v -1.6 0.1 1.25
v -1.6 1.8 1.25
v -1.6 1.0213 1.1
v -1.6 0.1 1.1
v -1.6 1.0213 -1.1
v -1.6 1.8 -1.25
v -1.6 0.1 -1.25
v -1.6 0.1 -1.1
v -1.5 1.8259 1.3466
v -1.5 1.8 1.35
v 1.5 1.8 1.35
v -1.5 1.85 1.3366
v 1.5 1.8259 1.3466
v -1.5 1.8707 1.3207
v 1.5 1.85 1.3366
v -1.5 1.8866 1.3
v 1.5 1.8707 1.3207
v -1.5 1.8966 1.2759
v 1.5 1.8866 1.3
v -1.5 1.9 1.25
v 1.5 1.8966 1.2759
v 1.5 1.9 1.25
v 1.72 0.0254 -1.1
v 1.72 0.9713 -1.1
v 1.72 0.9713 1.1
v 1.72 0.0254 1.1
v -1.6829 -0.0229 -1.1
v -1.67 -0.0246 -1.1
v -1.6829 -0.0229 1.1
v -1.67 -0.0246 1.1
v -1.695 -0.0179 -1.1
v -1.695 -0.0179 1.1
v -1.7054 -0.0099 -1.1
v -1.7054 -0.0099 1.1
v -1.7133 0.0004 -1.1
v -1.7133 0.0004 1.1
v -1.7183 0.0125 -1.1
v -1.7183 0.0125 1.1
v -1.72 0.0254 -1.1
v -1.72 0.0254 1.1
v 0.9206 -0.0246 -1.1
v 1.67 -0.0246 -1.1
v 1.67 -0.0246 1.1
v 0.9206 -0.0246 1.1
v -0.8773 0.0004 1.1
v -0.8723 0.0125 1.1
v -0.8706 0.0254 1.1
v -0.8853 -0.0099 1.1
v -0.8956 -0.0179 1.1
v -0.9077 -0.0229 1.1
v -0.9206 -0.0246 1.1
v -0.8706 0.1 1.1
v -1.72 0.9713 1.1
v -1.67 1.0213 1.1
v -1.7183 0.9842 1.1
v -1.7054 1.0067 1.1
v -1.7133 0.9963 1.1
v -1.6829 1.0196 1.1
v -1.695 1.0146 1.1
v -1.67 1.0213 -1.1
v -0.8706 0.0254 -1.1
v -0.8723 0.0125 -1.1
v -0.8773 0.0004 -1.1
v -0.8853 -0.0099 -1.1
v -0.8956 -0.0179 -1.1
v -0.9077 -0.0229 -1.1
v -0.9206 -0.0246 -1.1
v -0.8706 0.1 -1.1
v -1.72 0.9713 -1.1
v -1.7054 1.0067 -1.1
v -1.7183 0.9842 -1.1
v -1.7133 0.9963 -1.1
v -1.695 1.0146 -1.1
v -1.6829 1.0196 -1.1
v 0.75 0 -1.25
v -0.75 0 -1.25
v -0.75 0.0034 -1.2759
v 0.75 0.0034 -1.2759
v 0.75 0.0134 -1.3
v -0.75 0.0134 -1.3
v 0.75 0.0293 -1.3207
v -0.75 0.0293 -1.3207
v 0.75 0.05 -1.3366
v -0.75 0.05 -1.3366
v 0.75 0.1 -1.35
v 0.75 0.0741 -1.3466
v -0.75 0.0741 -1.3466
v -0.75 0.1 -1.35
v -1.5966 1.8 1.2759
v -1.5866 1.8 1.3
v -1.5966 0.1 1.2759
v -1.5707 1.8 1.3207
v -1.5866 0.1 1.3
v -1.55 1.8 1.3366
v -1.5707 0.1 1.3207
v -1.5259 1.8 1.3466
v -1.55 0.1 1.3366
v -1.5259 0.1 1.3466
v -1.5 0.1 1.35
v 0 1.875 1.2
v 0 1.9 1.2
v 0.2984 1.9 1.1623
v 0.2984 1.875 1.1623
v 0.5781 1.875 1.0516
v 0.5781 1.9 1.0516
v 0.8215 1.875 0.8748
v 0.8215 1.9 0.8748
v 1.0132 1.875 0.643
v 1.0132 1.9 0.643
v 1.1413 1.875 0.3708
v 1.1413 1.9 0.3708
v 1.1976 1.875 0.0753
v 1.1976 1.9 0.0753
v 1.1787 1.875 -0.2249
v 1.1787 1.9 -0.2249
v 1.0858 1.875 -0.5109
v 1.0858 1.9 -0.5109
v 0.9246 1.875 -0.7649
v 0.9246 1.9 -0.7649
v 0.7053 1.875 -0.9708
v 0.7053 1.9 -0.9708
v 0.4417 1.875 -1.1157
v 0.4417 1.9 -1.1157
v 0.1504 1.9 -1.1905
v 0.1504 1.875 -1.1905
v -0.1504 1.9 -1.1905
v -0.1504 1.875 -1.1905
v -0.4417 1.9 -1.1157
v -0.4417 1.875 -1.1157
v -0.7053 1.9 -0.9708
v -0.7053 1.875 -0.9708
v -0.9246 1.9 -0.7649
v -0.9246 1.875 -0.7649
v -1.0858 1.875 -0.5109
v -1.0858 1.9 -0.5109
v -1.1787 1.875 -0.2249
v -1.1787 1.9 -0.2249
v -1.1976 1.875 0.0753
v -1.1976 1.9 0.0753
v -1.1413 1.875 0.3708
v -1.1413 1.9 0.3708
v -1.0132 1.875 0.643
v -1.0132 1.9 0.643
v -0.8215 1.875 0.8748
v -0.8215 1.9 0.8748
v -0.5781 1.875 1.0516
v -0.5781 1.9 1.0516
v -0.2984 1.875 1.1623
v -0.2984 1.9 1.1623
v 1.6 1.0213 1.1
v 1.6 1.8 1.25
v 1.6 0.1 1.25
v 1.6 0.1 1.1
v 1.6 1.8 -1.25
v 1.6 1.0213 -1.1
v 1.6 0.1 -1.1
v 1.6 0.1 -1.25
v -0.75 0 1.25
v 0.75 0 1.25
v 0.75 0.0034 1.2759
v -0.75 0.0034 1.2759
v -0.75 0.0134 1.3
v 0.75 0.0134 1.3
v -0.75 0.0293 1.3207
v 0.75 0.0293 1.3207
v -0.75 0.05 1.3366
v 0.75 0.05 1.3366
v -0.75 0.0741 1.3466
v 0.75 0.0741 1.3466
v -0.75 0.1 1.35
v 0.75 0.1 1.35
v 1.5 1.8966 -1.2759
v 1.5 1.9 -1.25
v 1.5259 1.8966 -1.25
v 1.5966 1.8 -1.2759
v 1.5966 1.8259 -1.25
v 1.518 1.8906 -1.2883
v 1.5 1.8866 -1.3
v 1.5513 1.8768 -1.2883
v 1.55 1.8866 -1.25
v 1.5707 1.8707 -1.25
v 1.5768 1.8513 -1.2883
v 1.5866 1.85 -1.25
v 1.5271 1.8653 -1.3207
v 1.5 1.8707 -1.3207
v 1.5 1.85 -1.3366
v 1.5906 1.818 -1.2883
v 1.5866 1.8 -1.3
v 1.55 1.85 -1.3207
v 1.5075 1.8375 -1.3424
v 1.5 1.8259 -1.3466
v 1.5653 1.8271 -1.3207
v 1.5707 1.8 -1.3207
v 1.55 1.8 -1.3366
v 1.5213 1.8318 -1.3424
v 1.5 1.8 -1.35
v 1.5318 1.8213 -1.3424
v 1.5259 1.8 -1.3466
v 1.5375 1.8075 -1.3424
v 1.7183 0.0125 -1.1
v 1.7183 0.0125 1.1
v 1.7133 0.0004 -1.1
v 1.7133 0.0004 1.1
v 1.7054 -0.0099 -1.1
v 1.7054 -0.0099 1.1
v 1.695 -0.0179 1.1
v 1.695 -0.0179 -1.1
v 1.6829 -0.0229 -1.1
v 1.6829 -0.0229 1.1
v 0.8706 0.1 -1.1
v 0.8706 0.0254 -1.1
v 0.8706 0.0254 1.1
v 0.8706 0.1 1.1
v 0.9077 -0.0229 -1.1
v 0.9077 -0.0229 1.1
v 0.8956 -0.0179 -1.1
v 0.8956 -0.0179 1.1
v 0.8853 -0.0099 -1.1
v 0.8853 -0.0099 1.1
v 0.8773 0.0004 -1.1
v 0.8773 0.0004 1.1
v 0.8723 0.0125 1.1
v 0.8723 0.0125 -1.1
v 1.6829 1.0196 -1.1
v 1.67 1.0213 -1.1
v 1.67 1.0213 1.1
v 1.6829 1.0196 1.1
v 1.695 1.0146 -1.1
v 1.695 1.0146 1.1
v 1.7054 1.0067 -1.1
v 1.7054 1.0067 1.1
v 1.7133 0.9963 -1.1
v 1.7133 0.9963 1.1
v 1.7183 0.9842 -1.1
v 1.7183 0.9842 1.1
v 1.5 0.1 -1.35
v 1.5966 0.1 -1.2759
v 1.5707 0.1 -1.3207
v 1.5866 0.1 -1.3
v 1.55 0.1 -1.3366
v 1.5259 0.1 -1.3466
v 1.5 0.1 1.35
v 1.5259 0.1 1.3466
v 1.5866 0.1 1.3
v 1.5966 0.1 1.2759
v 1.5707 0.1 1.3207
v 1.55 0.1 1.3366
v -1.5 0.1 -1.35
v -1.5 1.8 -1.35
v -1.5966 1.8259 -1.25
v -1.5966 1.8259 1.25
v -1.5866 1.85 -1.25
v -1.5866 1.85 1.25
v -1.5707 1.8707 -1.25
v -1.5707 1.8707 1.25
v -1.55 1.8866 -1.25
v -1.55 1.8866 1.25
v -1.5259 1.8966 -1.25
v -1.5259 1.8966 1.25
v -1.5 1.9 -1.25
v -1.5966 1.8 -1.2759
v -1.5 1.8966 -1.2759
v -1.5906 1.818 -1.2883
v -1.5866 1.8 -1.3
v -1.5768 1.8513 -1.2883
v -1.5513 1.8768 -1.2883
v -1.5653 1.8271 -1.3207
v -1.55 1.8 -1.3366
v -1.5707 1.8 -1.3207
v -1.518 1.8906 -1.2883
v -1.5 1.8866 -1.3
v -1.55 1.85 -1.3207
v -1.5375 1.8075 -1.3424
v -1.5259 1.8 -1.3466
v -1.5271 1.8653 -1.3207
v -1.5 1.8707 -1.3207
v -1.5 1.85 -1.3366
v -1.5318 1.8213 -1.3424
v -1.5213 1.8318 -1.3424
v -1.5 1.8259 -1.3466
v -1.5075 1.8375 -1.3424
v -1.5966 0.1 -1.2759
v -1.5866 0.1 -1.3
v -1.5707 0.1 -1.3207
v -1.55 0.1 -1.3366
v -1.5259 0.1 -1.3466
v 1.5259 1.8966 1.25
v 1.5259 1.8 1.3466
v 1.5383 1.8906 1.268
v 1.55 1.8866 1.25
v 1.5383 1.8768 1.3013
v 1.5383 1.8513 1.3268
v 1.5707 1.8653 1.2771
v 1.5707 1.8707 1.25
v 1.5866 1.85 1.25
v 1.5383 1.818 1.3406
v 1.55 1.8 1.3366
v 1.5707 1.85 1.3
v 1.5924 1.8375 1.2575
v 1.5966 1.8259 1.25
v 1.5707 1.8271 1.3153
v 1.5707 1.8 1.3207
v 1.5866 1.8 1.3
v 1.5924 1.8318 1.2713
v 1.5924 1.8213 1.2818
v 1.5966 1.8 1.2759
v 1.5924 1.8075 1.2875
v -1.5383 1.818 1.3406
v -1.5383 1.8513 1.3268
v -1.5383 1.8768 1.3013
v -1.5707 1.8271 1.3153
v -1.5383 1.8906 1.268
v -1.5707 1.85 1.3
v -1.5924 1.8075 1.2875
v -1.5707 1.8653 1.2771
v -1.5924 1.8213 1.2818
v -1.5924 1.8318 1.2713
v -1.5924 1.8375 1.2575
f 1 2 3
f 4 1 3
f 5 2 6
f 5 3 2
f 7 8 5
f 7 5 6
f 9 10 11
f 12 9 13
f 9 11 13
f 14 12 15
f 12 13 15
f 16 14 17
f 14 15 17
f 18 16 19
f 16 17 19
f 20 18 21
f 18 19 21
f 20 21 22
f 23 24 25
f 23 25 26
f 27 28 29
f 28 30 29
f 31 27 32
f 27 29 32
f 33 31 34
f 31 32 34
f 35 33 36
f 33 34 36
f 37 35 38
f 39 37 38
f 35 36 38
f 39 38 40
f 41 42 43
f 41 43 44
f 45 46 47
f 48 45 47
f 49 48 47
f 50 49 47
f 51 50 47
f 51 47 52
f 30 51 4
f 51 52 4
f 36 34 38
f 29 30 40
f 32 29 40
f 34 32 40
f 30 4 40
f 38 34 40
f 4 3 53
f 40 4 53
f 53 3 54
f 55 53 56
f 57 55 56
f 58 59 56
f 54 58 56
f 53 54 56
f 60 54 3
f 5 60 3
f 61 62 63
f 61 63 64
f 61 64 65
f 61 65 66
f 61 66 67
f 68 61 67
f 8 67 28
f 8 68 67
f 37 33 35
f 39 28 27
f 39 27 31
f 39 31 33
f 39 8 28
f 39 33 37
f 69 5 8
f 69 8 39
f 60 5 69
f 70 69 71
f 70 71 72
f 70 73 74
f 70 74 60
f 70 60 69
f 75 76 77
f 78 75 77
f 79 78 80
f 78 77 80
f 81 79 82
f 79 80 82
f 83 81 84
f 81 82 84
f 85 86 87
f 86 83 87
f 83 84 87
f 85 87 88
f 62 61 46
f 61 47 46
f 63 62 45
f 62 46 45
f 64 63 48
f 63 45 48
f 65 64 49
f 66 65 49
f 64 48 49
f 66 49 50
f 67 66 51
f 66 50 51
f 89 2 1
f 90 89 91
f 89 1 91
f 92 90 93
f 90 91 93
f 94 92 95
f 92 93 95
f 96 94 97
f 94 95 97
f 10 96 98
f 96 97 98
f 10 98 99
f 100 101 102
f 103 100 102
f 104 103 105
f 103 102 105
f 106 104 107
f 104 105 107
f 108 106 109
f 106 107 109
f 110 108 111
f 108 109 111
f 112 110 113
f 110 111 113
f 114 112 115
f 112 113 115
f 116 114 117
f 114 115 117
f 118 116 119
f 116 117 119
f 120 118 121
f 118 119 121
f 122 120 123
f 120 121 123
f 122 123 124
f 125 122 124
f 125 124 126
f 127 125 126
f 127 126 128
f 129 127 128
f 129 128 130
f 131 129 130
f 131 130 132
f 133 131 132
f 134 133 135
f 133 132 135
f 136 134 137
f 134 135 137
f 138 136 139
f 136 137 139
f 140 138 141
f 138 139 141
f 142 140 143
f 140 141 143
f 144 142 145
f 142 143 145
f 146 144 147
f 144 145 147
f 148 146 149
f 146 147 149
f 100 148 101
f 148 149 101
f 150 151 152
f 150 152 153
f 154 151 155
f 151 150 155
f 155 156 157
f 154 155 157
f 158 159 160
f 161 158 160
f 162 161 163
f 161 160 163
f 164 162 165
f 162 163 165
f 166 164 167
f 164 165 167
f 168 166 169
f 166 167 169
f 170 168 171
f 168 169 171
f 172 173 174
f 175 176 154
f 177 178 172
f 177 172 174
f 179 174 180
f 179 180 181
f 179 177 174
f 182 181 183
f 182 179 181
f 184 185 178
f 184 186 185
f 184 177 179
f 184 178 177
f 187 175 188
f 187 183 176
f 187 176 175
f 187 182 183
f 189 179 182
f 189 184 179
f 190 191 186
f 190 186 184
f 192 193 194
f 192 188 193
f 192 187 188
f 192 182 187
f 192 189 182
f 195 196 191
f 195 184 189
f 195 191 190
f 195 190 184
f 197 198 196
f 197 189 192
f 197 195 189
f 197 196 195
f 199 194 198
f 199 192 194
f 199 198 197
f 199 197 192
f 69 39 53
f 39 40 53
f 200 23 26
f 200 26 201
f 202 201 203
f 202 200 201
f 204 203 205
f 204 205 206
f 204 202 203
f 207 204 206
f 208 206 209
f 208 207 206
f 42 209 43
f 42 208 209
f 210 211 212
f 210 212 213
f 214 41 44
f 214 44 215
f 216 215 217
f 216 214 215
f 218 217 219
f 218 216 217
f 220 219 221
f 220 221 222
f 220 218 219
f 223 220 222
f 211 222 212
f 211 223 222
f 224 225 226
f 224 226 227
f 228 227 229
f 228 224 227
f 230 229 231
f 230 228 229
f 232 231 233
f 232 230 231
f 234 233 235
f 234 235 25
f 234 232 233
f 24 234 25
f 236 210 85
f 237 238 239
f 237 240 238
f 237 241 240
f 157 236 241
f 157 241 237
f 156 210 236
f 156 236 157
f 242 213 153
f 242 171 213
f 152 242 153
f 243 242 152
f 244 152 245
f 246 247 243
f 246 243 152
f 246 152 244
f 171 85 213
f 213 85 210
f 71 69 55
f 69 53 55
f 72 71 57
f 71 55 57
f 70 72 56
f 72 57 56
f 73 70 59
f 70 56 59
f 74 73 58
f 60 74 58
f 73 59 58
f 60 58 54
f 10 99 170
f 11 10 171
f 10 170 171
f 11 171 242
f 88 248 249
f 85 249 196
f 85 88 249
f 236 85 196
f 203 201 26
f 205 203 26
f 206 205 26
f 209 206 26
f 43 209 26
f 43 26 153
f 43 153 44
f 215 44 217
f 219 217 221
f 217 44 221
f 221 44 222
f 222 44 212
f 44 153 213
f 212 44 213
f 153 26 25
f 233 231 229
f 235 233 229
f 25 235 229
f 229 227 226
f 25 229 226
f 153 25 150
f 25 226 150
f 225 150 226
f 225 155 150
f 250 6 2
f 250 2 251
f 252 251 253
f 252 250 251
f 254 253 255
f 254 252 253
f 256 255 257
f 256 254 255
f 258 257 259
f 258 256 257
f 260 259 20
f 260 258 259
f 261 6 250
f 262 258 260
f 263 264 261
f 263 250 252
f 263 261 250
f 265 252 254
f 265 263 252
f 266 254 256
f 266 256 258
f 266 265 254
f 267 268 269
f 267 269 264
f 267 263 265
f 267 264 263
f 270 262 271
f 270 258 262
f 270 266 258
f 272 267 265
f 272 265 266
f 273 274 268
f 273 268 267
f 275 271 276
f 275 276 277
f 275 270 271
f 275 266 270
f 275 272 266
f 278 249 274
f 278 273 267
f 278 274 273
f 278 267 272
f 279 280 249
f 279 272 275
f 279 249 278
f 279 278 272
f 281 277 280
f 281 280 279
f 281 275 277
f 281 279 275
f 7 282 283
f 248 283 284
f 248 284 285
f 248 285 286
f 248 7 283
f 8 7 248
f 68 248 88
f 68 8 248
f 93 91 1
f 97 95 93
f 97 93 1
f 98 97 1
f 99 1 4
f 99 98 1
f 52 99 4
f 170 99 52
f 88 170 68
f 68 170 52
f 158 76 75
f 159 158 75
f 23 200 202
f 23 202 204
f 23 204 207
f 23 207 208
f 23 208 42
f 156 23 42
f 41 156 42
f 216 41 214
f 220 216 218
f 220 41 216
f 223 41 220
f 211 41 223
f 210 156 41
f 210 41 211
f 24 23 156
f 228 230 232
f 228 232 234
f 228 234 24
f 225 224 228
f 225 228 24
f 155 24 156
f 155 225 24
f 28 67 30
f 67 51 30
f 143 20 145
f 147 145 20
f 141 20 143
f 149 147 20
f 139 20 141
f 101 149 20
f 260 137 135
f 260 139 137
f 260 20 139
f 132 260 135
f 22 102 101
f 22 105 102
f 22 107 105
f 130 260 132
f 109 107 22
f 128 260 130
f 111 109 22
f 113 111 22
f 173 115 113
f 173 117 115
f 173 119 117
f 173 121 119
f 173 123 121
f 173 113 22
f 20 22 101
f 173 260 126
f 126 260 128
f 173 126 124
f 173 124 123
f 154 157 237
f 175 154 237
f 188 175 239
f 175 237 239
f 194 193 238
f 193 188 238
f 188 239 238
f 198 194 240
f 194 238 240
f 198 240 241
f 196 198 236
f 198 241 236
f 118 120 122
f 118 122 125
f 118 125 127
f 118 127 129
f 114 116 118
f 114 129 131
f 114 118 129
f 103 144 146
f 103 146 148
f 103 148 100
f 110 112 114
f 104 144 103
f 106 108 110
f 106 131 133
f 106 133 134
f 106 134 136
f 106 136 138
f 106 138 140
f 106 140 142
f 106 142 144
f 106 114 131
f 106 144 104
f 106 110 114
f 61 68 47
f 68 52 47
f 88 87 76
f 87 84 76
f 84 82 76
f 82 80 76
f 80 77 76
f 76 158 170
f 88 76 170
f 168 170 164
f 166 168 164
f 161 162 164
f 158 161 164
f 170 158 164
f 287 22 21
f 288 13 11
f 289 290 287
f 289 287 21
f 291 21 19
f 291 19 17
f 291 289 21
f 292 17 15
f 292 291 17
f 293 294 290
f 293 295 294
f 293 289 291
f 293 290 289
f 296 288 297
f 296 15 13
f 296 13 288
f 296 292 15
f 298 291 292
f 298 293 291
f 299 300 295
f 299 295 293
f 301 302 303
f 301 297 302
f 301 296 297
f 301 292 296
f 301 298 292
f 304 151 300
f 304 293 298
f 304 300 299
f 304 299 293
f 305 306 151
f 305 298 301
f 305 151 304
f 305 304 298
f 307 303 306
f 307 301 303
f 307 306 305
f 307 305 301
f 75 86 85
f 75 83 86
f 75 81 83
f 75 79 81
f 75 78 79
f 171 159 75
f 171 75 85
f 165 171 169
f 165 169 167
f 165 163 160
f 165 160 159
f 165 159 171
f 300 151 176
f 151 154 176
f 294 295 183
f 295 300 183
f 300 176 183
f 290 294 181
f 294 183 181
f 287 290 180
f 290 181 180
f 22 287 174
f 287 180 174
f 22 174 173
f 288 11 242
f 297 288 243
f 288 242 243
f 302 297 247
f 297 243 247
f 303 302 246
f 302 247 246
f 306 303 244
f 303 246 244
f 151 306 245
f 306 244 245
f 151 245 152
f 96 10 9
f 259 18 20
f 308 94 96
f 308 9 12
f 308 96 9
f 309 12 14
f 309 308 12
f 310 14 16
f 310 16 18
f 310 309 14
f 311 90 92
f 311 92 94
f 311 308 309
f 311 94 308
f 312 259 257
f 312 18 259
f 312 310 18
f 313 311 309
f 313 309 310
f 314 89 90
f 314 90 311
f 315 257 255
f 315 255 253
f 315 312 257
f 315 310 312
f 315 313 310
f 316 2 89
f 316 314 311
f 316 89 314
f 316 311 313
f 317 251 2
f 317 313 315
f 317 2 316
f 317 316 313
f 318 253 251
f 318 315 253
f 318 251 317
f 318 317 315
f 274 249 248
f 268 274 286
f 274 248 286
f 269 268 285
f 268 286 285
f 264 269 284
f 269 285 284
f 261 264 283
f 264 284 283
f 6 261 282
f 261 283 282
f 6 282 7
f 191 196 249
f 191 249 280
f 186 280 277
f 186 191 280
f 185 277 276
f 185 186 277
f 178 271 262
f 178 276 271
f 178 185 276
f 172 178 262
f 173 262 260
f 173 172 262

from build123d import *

# Parameters (mm, degrees)
SKETCH_2_W          = 3.2
SKETCH_2_H          = 2.7
EXTRUDE_1_DEPTH     = 1.9
FILLET_1_R          = 0.1
FILLET_2_R          = 0.1
FILLET_3_R          = 0.1
FILLET_4_R          = 0.1
FILLET_5_R          = 0.1
SKETCH_3_R          = 1.2
CUT_EXTRUDE_1_DEPTH = 0.025
SKETCH_4_W          = 0.92775498
SKETCH_4_H          = 2.835918068
CUT_EXTRUDE_2_DEPTH = 0.1
EXTRUDE_3_DEPTH     = 1.1


with BuildPart() as part:
    # Эскиз2 → Бобышка-Вытянуть1 (new body)
    with BuildSketch(Plane(origin=(0, 0, 0), x_dir=(1, 0, 0), z_dir=(0, 1, 0))):
        Rectangle(SKETCH_2_W, SKETCH_2_H)
    extrude(amount=EXTRUDE_1_DEPTH)

    # Скругление1
    fillet_1_edges = [part.edges().sort_by_distance(p)[0] for p in [
        (-1.6, 1.9, 0),
        (0, 1.9, 1.35),
        (1.6, 1.9, 0),
        (0, 1.9, -1.35),
    ]]
    fillet(fillet_1_edges, radius=FILLET_1_R)

    # Скругление2
    # the kernel refuses this fillet: 0.1 mm, written as the material it takes off along each edge
    with BuildSketch(Plane(origin=(-1.5, 1.8, 1.25), x_dir=(0, 0, 1), z_dir=(-1, 0, 0))) as fillet_2_piece_1_section:
        Polygon((0, 0), (FILLET_2_R, 0), (FILLET_2_R, FILLET_2_R), (0, FILLET_2_R), align=None)
    fillet_2_piece_1 = extrude(amount=FILLET_2_R, mode=Mode.PRIVATE)
    fillet_2_piece_1 = fillet_2_piece_1 - Plane(origin=(-1.5, 1.8, 1.25), x_dir=(0, -0.7071067811865475, -0.7071067811865475), z_dir=(-1, 0, 0)) * Sphere(FILLET_2_R, mode=Mode.PRIVATE)
    add(fillet_2_piece_1, mode=Mode.SUBTRACT)
    with BuildSketch(Plane(origin=(1.5, 1.8, 1.25), x_dir=(0, 0, 1), z_dir=(1, 0, 0))) as fillet_2_piece_2_section:
        Polygon((0, 0), (FILLET_2_R, 0), (FILLET_2_R, -FILLET_2_R), (0, -FILLET_2_R), align=None)
    fillet_2_piece_2 = extrude(amount=FILLET_2_R, mode=Mode.PRIVATE)
    fillet_2_piece_2 = fillet_2_piece_2 - Plane(origin=(1.5, 1.8, 1.25), x_dir=(0, -0.7071067811865475, -0.7071067811865475), z_dir=(1, 0, 0)) * Sphere(FILLET_2_R, mode=Mode.PRIVATE)
    add(fillet_2_piece_2, mode=Mode.SUBTRACT)
    with BuildSketch(Plane(origin=(1.6, -0.25, 1.35), x_dir=(0, 0, -1), z_dir=(0, 1, 0))) as fillet_2_piece_3:
        with BuildLine():
            CenterArc((FILLET_2_R, FILLET_2_R), FILLET_2_R, 180, 90)
            Line((0, FILLET_2_R), (0, 0))
            Line((0, 0), (FILLET_2_R, 0))
        make_face()
    extrude(amount=2.05, mode=Mode.SUBTRACT)
    with BuildSketch(Plane(origin=(-1.6, -0.25, 1.35), x_dir=(0, 0, -1), z_dir=(0, 1, 0))) as fillet_2_piece_4:
        with BuildLine():
            CenterArc((FILLET_2_R, -FILLET_2_R), FILLET_2_R, 90, 90)
            Line((0, -FILLET_2_R), (0, 0))
            Line((0, 0), (FILLET_2_R, 0))
        make_face()
    extrude(amount=2.05, mode=Mode.SUBTRACT)
    with BuildSketch(Plane(origin=(1.85, 0, 1.35), x_dir=(0, 0, -1), z_dir=(-1, 0, 0))) as fillet_2_piece_5:
        with BuildLine():
            CenterArc((FILLET_2_R, -FILLET_2_R), FILLET_2_R, 90, 90)
            Line((0, -FILLET_2_R), (0, 0))
            Line((0, 0), (FILLET_2_R, 0))
        make_face()
    extrude(amount=3.7, mode=Mode.SUBTRACT)

    # Скругление3
    # the kernel refuses this fillet: 0.1 mm, written as the material it takes off along each edge
    with BuildSketch(Plane(origin=(1.5, 1.8, -1.25), x_dir=(1, 0, 0), z_dir=(0, 0, -1))) as fillet_3_piece_1_section:
        Polygon((0, 0), (FILLET_3_R, 0), (FILLET_3_R, -FILLET_3_R), (0, -FILLET_3_R), align=None)
    fillet_3_piece_1 = extrude(amount=FILLET_3_R, mode=Mode.PRIVATE)
    fillet_3_piece_1 = fillet_3_piece_1 - Plane(origin=(1.5, 1.8, -1.25), x_dir=(-0.7071067811865475, -0.7071067811865475, 0), z_dir=(0, 0, -1)) * Sphere(FILLET_3_R, mode=Mode.PRIVATE)
    add(fillet_3_piece_1, mode=Mode.SUBTRACT)
    with BuildSketch(Plane(origin=(1.5, 0.1, 1.25), x_dir=(1, 0, 0), z_dir=(0, -1, 0))) as fillet_3_piece_2_section:
        Polygon((0, 0), (FILLET_3_R, 0), (FILLET_3_R, FILLET_3_R), (0, FILLET_3_R), align=None)
    fillet_3_piece_2 = extrude(amount=FILLET_3_R, mode=Mode.PRIVATE)
    fillet_3_piece_2 = fillet_3_piece_2 - Plane(origin=(1.5, 0.1, 1.25), x_dir=(-0.7071067811865476, 0, -0.7071067811865475), z_dir=(0, -1, 0)) * Sphere(FILLET_3_R, mode=Mode.PRIVATE)
    add(fillet_3_piece_2, mode=Mode.SUBTRACT)
    with BuildSketch(Plane(origin=(1.6, -0.25, -1.35), x_dir=(-1, 0, 0), z_dir=(0, 1, 0))) as fillet_3_piece_3:
        with BuildLine():
            CenterArc((FILLET_3_R, FILLET_3_R), FILLET_3_R, 180, 90)
            Line((0, FILLET_3_R), (0, 0))
            Line((0, 0), (FILLET_3_R, 0))
        make_face()
    extrude(amount=2.05, mode=Mode.SUBTRACT)
    with BuildSketch(Plane(origin=(1.6, 0, -1.6), x_dir=(-1, 0, 0), z_dir=(0, 0, 1))) as fillet_3_piece_4:
        with BuildLine():
            CenterArc((FILLET_3_R, -FILLET_3_R), FILLET_3_R, 90, 90)
            Line((0, -FILLET_3_R), (0, 0))
            Line((0, 0), (FILLET_3_R, 0))
        make_face()
    extrude(amount=2.85, mode=Mode.SUBTRACT)

    # Скругление4
    # the kernel refuses this fillet: 0.1 mm, written as the material it takes off along each edge
    with BuildSketch(Plane(origin=(-1.5, 1.8, -1.25), x_dir=(-1, 0, 0), z_dir=(0, 0, -1))) as fillet_4_piece_1_section:
        Polygon((0, 0), (FILLET_4_R, 0), (FILLET_4_R, FILLET_4_R), (0, FILLET_4_R), align=None)
    fillet_4_piece_1 = extrude(amount=FILLET_4_R, mode=Mode.PRIVATE)
    fillet_4_piece_1 = fillet_4_piece_1 - Plane(origin=(-1.5, 1.8, -1.25), x_dir=(0.7071067811865475, -0.7071067811865475, 0), z_dir=(0, 0, -1)) * Sphere(FILLET_4_R, mode=Mode.PRIVATE)
    add(fillet_4_piece_1, mode=Mode.SUBTRACT)
    with BuildSketch(Plane(origin=(1.5, 0.1, -1.25), x_dir=(0, -1, 0), z_dir=(0, 0, -1))) as fillet_4_piece_2_section:
        Polygon((0, 0), (FILLET_4_R, 0), (FILLET_4_R, -FILLET_4_R), (0, -FILLET_4_R), align=None)
    fillet_4_piece_2 = extrude(amount=FILLET_4_R, mode=Mode.PRIVATE)
    fillet_4_piece_2 = fillet_4_piece_2 - Plane(origin=(1.5, 0.1, -1.25), x_dir=(-0.7071067811865475, 0.7071067811865475, 0), z_dir=(0, 0, -1)) * Sphere(FILLET_4_R, mode=Mode.PRIVATE)
    add(fillet_4_piece_2, mode=Mode.SUBTRACT)
    with BuildSketch(Plane(origin=(-1.6, -0.25, -1.35), x_dir=(1, 0, 0), z_dir=(0, 1, 0))) as fillet_4_piece_3:
        with BuildLine():
            CenterArc((FILLET_4_R, -FILLET_4_R), FILLET_4_R, 90, 90)
            Line((0, -FILLET_4_R), (0, 0))
            Line((0, 0), (FILLET_4_R, 0))
        make_face()
    extrude(amount=2.05, mode=Mode.SUBTRACT)
    with BuildSketch(Plane(origin=(-1.85, 0, -1.35), x_dir=(0, 1, 0), z_dir=(1, 0, 0))) as fillet_4_piece_4:
        with BuildLine():
            CenterArc((FILLET_4_R, FILLET_4_R), FILLET_4_R, 180, 90)
            Line((0, FILLET_4_R), (0, 0))
            Line((0, 0), (FILLET_4_R, 0))
        make_face()
    extrude(amount=3.35, mode=Mode.SUBTRACT)

    # Скругление5
    # the kernel refuses this fillet: 0.1 mm, written as the material it takes off along each edge
    with BuildSketch(Plane(origin=(-1.5, 0.1, 1.25), x_dir=(-1, 0, 0), z_dir=(0, -1, 0))) as fillet_5_piece_1_section:
        Polygon((0, 0), (FILLET_5_R, 0), (FILLET_5_R, -FILLET_5_R), (0, -FILLET_5_R), align=None)
    fillet_5_piece_1 = extrude(amount=FILLET_5_R, mode=Mode.PRIVATE)
    fillet_5_piece_1 = fillet_5_piece_1 - Plane(origin=(-1.5, 0.1, 1.25), x_dir=(0.7071067811865475, 0, -0.7071067811865477), z_dir=(0, -1, 0)) * Sphere(FILLET_5_R, mode=Mode.PRIVATE)
    add(fillet_5_piece_1, mode=Mode.SUBTRACT)
    with BuildSketch(Plane(origin=(-1.5, 0.1, -1.25), x_dir=(-1, 0, 0), z_dir=(0, -1, 0))) as fillet_5_piece_2_section:
        Polygon((0, 0), (FILLET_5_R, 0), (FILLET_5_R, FILLET_5_R), (0, FILLET_5_R), align=None)
    fillet_5_piece_2 = extrude(amount=FILLET_5_R, mode=Mode.PRIVATE)
    fillet_5_piece_2 = fillet_5_piece_2 - Plane(origin=(-1.5, 0.1, -1.25), x_dir=(0.7071067811865476, 0, 0.7071067811865475), z_dir=(0, -1, 0)) * Sphere(FILLET_5_R, mode=Mode.PRIVATE)
    add(fillet_5_piece_2, mode=Mode.SUBTRACT)
    with BuildSketch(Plane(origin=(-1.6, 0, 1.25), x_dir=(1, 0, 0), z_dir=(0, 0, -1))) as fillet_5_piece_3:
        with BuildLine():
            CenterArc((FILLET_5_R, -FILLET_5_R), FILLET_5_R, 90, 90)
            Line((0, -FILLET_5_R), (0, 0))
            Line((0, 0), (FILLET_5_R, 0))
        make_face()
    extrude(amount=2.5, mode=Mode.SUBTRACT)

    # Эскиз3 → Вырез-Вытянуть1 (cut)
    with BuildSketch(Plane(origin=(0, 1.9, 0), x_dir=(1, 0, 0), z_dir=(0, 1, 0))):
        with Locations(Location((0, 0, 0), (0, 0, 270))):
            Circle(SKETCH_3_R)
    extrude(amount=-CUT_EXTRUDE_1_DEPTH, mode=Mode.SUBTRACT)

    # Эскиз4 → Вырез-Вытянуть2 (cut)
    with BuildSketch(Plane.XZ):
        with Locations((1.213877491, 0.001548995)):
            Rectangle(SKETCH_4_W, SKETCH_4_H)
        with Locations((-1.213877491, 0.001548995)):
            Rectangle(SKETCH_4_W, SKETCH_4_H)
    extrude(amount=-CUT_EXTRUDE_2_DEPTH, mode=Mode.SUBTRACT)

    # Эскиз6 → Бобышка-Вытянуть3 (add, symmetric)
    with BuildSketch(Plane(origin=(0, 0, 0), x_dir=(-1, 0, 0), z_dir=(0, 0, -1))):
        with BuildLine():
            Line((1.6, 0.1), (0.87063337, 0.1))
            Line((0.87063337, 0.1), (0.87063337, 0.025437095))
            ThreePointArc((0.87063337, 0.025437095), (0.885278031, -0.009918244), (0.92063337, -0.024562905))
            Line((0.92063337, -0.024562905), (1.67, -0.024562905))
            ThreePointArc((1.67, -0.024562905), (1.705355339, -0.009918244), (1.72, 0.025437095))
            Line((1.72, 0.025437095), (1.72, 0.971300934))
            ThreePointArc((1.72, 0.971300934), (1.705355339, 1.006656273), (1.67, 1.021300934))
            Line((1.67, 1.021300934), (1.6, 1.021300934))
            Line((1.6, 1.021300934), (1.6, 0.1))
        make_face()
        with BuildLine():
            Line((-1.6, 1.021300934), (-1.67, 1.021300934))
            ThreePointArc((-1.67, 1.021300934), (-1.705355339, 1.006656273), (-1.72, 0.971300934))
            Line((-1.72, 0.971300934), (-1.72, 0.025437095))
            ThreePointArc((-1.72, 0.025437095), (-1.705355339, -0.009918244), (-1.67, -0.024562905))
            Line((-1.67, -0.024562905), (-0.92063337, -0.024562905))
            ThreePointArc((-0.92063337, -0.024562905), (-0.885278031, -0.009918244), (-0.87063337, 0.025437095))
            Line((-0.87063337, 0.025437095), (-0.87063337, 0.1))
            Line((-0.87063337, 0.1), (-1.6, 0.1))
            Line((-1.6, 0.1), (-1.6, 1.021300934))
        make_face()
    extrude(amount=EXTRUDE_3_DEPTH, both=True)


solid = part.part
